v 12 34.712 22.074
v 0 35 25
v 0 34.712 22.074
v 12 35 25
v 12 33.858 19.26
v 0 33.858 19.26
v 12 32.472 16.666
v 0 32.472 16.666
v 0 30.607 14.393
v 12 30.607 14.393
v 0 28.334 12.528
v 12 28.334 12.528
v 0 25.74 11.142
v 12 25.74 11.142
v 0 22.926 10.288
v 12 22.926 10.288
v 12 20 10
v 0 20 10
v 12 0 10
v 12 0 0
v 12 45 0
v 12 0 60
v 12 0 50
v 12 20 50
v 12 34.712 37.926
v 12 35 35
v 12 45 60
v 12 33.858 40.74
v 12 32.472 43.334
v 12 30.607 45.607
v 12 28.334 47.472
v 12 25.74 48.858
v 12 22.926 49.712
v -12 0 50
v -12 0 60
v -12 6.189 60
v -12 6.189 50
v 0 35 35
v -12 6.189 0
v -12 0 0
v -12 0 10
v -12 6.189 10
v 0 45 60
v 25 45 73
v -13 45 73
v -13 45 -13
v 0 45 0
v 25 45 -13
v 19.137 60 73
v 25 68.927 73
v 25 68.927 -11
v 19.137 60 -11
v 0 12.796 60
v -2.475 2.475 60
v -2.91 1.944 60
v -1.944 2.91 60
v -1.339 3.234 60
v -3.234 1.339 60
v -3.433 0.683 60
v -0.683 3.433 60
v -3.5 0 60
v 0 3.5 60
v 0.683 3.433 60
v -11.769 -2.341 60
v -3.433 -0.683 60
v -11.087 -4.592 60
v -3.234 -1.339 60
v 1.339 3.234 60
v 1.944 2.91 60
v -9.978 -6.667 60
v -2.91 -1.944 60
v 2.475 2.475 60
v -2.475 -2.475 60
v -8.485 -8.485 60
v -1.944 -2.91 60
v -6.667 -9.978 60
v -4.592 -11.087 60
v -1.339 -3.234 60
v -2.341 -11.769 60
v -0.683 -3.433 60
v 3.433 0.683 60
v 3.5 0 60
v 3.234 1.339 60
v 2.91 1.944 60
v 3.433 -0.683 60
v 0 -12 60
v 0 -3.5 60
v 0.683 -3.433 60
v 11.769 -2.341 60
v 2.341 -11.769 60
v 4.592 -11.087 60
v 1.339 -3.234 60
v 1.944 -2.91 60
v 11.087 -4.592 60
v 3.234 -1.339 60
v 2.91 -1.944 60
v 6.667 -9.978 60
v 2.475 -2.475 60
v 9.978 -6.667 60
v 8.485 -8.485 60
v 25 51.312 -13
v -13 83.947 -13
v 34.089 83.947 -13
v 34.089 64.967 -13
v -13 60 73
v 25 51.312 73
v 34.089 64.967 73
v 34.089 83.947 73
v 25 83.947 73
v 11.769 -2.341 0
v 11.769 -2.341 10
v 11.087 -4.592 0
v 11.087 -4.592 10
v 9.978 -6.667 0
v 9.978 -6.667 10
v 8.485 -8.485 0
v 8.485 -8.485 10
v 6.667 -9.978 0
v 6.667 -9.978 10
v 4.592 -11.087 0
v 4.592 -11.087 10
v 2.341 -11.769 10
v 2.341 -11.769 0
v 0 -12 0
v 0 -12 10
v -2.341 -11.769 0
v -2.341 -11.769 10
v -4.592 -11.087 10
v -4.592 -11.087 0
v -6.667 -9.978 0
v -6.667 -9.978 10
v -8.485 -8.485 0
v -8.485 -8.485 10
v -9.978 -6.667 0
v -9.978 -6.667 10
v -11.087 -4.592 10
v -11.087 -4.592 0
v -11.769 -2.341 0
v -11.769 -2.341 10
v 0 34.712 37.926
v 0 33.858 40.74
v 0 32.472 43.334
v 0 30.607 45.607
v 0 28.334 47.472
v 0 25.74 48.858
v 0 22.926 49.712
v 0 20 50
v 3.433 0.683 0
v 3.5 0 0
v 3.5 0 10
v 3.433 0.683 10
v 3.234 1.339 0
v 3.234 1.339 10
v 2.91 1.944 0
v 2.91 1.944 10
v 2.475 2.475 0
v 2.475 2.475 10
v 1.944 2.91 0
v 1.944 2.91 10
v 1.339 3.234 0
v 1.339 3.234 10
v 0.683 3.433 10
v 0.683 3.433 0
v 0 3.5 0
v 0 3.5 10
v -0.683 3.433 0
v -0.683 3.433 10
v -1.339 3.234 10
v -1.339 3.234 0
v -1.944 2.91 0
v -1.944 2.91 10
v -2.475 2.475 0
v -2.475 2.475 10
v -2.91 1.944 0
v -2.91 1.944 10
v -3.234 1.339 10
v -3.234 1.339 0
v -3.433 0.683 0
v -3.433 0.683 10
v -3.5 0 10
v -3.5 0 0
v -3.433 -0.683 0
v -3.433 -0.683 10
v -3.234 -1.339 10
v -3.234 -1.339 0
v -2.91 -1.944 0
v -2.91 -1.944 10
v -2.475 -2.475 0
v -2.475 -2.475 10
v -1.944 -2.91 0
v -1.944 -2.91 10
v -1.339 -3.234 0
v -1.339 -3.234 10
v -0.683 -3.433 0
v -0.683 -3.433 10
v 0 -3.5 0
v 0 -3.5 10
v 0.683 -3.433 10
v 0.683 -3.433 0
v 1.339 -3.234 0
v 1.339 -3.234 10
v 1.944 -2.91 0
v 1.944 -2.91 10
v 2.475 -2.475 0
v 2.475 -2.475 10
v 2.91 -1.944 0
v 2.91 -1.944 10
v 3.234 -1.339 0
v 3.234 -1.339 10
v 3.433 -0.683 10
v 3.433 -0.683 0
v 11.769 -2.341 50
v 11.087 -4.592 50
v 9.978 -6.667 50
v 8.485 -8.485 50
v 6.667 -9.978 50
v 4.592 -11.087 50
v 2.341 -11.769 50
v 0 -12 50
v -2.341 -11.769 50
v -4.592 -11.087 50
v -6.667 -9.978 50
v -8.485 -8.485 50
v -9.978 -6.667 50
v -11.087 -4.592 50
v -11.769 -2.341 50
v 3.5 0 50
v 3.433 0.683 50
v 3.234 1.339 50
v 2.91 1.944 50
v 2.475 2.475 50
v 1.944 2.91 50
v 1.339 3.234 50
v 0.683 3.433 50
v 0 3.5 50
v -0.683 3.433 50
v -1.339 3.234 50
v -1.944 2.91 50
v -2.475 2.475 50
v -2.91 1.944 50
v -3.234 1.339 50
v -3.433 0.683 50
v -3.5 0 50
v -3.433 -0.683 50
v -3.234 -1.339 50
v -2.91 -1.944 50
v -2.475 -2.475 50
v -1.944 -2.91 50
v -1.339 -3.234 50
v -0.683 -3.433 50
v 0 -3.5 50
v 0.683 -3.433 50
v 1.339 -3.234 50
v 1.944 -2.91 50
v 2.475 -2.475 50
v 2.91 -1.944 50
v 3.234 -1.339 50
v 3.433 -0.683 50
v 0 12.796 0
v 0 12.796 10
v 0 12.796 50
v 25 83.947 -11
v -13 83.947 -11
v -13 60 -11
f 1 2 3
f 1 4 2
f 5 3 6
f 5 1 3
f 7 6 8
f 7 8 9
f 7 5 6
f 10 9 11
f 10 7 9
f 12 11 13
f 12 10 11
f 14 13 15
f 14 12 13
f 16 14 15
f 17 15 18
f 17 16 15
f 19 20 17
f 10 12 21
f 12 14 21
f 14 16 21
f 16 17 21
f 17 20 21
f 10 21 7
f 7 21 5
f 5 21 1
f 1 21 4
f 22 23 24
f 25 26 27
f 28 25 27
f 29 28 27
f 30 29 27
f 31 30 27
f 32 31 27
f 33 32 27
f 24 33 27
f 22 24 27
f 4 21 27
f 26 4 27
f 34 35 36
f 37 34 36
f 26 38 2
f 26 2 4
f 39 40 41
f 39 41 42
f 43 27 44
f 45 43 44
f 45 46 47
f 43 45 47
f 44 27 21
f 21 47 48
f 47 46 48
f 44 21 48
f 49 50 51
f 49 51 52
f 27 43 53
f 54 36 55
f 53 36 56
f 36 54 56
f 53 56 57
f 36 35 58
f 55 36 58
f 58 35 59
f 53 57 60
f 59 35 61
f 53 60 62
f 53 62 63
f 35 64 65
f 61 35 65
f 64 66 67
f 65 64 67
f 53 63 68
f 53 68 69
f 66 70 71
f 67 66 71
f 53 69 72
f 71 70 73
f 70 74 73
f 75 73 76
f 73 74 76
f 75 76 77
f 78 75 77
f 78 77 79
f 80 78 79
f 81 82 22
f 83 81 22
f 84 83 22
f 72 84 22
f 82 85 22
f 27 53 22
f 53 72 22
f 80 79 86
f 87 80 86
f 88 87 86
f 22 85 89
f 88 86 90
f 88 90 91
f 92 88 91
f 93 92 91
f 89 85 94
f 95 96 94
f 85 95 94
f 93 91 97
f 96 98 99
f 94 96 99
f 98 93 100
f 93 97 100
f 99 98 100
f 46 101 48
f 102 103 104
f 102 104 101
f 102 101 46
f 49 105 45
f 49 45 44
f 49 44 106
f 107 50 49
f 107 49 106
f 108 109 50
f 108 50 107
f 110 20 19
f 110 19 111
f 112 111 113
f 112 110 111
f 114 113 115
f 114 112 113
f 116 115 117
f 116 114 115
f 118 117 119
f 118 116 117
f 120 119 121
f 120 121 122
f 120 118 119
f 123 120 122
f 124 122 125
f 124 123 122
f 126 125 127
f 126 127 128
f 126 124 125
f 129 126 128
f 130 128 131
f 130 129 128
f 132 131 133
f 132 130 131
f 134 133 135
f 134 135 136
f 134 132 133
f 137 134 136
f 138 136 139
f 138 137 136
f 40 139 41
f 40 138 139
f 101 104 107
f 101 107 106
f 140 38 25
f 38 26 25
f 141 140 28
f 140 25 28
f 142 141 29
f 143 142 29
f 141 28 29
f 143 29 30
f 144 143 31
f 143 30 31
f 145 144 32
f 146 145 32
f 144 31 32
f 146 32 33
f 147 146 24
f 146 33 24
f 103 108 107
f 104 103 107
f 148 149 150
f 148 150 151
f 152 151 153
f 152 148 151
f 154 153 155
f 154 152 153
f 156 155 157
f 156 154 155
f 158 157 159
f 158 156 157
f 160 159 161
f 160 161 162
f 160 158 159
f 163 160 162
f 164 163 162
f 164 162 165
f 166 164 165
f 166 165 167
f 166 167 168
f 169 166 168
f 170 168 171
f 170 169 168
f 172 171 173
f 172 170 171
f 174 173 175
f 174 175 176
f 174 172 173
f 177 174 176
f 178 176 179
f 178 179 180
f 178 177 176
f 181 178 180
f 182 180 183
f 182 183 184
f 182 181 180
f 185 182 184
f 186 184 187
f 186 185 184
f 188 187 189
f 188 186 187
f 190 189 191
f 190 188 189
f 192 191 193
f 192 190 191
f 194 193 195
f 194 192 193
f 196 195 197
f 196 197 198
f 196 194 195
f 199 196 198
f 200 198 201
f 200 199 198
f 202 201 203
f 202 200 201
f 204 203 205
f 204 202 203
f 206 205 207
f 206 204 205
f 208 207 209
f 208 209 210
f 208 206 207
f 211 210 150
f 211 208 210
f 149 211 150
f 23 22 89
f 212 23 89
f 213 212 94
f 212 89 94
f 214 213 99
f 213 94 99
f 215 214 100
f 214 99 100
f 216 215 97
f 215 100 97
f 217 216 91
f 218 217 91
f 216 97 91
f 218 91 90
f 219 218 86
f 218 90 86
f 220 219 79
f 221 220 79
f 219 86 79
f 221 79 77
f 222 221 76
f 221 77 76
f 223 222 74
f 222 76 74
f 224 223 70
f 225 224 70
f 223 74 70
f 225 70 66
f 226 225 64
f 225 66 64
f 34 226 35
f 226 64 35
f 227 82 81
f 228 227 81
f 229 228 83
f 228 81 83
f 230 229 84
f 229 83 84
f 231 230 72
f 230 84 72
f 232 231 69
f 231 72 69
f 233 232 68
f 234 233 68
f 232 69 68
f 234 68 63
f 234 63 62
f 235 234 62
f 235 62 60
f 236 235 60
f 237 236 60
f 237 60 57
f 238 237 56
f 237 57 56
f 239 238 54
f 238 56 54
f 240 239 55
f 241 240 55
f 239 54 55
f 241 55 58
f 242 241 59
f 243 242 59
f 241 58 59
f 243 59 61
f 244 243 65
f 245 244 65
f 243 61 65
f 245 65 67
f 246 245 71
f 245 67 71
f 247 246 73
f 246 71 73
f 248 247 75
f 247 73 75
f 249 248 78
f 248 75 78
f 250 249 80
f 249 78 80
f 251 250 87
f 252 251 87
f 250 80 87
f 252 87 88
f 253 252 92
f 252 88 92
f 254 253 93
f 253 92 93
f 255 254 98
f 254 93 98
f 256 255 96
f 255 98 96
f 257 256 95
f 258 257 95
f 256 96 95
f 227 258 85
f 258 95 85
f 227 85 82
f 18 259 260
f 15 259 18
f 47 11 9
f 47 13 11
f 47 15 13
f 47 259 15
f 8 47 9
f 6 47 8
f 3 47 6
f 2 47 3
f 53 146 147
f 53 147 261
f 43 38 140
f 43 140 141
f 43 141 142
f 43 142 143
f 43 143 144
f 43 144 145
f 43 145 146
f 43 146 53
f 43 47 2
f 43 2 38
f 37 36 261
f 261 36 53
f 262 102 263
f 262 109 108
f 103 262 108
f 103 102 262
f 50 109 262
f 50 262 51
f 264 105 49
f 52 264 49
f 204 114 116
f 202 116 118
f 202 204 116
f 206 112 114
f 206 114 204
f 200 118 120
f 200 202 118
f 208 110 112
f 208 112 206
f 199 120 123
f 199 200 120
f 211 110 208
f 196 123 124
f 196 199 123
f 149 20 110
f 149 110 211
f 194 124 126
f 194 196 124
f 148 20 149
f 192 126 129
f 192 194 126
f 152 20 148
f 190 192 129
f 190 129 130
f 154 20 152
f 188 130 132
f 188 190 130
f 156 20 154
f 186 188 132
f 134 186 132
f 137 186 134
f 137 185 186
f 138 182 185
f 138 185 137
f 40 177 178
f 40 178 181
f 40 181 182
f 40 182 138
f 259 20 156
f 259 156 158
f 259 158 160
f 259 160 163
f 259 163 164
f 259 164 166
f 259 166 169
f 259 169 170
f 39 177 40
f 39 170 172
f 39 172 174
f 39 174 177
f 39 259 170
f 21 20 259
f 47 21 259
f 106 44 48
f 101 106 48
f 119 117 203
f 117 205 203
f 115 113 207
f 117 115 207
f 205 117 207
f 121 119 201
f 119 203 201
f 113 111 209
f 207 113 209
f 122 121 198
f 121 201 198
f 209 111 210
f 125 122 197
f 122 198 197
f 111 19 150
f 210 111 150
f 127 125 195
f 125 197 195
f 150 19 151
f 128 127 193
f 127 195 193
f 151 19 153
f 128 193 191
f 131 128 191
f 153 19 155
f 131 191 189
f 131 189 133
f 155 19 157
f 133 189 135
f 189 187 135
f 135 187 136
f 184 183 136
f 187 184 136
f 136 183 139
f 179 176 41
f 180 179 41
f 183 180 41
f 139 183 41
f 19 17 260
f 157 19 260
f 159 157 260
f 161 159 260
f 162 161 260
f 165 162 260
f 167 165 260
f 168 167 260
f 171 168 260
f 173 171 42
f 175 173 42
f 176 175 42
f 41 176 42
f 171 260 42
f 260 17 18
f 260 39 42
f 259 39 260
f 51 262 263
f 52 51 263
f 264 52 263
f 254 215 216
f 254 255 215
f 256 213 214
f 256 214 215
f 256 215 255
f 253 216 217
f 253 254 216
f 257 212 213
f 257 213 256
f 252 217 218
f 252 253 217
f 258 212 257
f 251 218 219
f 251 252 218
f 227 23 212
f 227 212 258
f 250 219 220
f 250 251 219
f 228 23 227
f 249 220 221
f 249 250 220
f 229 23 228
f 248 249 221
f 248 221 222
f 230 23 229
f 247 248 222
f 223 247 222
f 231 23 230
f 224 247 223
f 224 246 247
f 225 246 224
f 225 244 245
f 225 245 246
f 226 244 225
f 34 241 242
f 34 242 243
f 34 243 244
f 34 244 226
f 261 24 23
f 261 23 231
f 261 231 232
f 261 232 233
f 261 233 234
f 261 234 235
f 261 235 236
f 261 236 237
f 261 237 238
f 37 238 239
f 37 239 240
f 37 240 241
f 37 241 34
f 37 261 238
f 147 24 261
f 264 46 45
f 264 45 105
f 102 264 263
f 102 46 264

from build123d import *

# Parameters (mm, degrees)
ESQUISSE1_R        = 3.5
BOSS_EXTRU_1_DEPTH = 10
BOSS_EXTRU_2_DEPTH = 5
ESQUISSE3_W        = 12
ESQUISSE3_H        = 40
BOSS_EXTRU_3_DEPTH = 5
CONG_1_R           = 15
ESQUISSE4_W        = 38
ESQUISSE4_H        = 86
BOSS_EXTRU_4_DEPTH = 15
BOSS_EXTRU_5_DEPTH = 85
BOSS_EXTRU_6_DEPTH = 2


with BuildPart() as part:
    # Esquisse1 → Boss.-Extru.1 (new body)
    with BuildSketch(Plane.XY):
        with BuildLine():
            Line((-12, 0), (-12, 6.188999999))
            Line((-12, 6.188999999), (0, 12.795952069))
            Line((0, 12.795952069), (0, 40))
            Line((0, 40), (12, 40))
            Line((12, 40), (12, 0))
            ThreePointArc((12, 0), (0, -12), (-12, 0))
        make_face()
        Circle(ESQUISSE1_R, mode=Mode.SUBTRACT)
    extrude(amount=BOSS_EXTRU_1_DEPTH)


with BuildPart() as body_2:
    # Esquisse2 → Boss.-Extru.2 (new body)
    with BuildSketch(Plane(origin=(0, 40, 0), x_dir=(1, 0, 0), z_dir=(0, 1, 0))):
        Polygon((0, -10), (0, -60), (12, -60), (12, -10), (12, 0), (0, 0), align=None)
    extrude(amount=BOSS_EXTRU_2_DEPTH)


with BuildPart() as body_3:
    # Symétrie2: mirrored copy
    add(part.part.mirror(Plane.XY.offset(30)))

    # Combiner1: union body 2, part
    add(body_2.part)
    add(part.part)

    # Esquisse3 → Boss.-Extru.3 (add)
    with BuildSketch(Plane.XZ.offset(-40)):
        with Locations((6, 30)):
            Rectangle(ESQUISSE3_W, ESQUISSE3_H)
    extrude(amount=BOSS_EXTRU_3_DEPTH)

    # Congé1
    cong_1_edges = [body_3.edges().sort_by_distance(p)[0] for p in [
        (6, 35, 10),
        (6, 35, 50),
    ]]
    fillet(cong_1_edges, radius=CONG_1_R)

    # Esquisse4 → Boss.-Extru.4 (add)
    with BuildSketch(Plane(origin=(0, 45, 0), x_dir=(1, 0, 0), z_dir=(0, 1, 0))):
        with Locations((6, -30)):
            Rectangle(ESQUISSE4_W, ESQUISSE4_H)
    extrude(amount=BOSS_EXTRU_4_DEPTH)

    # Esquisse5 → Boss.-Extru.5 (add)
    with BuildSketch(Plane.XY.offset(73)):
        Polygon((25, 51.312184347), (34.08898267, 64.966903238), (34.08898267, 83.946962496), (25, 83.946962496), (25, 68.926771716), (19.136954754, 60), align=None)
    extrude(amount=-BOSS_EXTRU_5_DEPTH)

    # Esquisse6 → Boss.-Extru.6 (add)
    with BuildSketch(Plane(origin=(0, 0, -13), x_dir=(-1, 0, 0), z_dir=(0, 0, -1))):
        Polygon((-34.08898267, 64.966903238), (-25, 51.312184347), (-25, 45), (13, 45), (13, 60), (13, 83.946962496), (-25, 83.946962496), (-34.08898267, 83.946962496), align=None)
    extrude(amount=-BOSS_EXTRU_6_DEPTH)


solid = body_3.part
